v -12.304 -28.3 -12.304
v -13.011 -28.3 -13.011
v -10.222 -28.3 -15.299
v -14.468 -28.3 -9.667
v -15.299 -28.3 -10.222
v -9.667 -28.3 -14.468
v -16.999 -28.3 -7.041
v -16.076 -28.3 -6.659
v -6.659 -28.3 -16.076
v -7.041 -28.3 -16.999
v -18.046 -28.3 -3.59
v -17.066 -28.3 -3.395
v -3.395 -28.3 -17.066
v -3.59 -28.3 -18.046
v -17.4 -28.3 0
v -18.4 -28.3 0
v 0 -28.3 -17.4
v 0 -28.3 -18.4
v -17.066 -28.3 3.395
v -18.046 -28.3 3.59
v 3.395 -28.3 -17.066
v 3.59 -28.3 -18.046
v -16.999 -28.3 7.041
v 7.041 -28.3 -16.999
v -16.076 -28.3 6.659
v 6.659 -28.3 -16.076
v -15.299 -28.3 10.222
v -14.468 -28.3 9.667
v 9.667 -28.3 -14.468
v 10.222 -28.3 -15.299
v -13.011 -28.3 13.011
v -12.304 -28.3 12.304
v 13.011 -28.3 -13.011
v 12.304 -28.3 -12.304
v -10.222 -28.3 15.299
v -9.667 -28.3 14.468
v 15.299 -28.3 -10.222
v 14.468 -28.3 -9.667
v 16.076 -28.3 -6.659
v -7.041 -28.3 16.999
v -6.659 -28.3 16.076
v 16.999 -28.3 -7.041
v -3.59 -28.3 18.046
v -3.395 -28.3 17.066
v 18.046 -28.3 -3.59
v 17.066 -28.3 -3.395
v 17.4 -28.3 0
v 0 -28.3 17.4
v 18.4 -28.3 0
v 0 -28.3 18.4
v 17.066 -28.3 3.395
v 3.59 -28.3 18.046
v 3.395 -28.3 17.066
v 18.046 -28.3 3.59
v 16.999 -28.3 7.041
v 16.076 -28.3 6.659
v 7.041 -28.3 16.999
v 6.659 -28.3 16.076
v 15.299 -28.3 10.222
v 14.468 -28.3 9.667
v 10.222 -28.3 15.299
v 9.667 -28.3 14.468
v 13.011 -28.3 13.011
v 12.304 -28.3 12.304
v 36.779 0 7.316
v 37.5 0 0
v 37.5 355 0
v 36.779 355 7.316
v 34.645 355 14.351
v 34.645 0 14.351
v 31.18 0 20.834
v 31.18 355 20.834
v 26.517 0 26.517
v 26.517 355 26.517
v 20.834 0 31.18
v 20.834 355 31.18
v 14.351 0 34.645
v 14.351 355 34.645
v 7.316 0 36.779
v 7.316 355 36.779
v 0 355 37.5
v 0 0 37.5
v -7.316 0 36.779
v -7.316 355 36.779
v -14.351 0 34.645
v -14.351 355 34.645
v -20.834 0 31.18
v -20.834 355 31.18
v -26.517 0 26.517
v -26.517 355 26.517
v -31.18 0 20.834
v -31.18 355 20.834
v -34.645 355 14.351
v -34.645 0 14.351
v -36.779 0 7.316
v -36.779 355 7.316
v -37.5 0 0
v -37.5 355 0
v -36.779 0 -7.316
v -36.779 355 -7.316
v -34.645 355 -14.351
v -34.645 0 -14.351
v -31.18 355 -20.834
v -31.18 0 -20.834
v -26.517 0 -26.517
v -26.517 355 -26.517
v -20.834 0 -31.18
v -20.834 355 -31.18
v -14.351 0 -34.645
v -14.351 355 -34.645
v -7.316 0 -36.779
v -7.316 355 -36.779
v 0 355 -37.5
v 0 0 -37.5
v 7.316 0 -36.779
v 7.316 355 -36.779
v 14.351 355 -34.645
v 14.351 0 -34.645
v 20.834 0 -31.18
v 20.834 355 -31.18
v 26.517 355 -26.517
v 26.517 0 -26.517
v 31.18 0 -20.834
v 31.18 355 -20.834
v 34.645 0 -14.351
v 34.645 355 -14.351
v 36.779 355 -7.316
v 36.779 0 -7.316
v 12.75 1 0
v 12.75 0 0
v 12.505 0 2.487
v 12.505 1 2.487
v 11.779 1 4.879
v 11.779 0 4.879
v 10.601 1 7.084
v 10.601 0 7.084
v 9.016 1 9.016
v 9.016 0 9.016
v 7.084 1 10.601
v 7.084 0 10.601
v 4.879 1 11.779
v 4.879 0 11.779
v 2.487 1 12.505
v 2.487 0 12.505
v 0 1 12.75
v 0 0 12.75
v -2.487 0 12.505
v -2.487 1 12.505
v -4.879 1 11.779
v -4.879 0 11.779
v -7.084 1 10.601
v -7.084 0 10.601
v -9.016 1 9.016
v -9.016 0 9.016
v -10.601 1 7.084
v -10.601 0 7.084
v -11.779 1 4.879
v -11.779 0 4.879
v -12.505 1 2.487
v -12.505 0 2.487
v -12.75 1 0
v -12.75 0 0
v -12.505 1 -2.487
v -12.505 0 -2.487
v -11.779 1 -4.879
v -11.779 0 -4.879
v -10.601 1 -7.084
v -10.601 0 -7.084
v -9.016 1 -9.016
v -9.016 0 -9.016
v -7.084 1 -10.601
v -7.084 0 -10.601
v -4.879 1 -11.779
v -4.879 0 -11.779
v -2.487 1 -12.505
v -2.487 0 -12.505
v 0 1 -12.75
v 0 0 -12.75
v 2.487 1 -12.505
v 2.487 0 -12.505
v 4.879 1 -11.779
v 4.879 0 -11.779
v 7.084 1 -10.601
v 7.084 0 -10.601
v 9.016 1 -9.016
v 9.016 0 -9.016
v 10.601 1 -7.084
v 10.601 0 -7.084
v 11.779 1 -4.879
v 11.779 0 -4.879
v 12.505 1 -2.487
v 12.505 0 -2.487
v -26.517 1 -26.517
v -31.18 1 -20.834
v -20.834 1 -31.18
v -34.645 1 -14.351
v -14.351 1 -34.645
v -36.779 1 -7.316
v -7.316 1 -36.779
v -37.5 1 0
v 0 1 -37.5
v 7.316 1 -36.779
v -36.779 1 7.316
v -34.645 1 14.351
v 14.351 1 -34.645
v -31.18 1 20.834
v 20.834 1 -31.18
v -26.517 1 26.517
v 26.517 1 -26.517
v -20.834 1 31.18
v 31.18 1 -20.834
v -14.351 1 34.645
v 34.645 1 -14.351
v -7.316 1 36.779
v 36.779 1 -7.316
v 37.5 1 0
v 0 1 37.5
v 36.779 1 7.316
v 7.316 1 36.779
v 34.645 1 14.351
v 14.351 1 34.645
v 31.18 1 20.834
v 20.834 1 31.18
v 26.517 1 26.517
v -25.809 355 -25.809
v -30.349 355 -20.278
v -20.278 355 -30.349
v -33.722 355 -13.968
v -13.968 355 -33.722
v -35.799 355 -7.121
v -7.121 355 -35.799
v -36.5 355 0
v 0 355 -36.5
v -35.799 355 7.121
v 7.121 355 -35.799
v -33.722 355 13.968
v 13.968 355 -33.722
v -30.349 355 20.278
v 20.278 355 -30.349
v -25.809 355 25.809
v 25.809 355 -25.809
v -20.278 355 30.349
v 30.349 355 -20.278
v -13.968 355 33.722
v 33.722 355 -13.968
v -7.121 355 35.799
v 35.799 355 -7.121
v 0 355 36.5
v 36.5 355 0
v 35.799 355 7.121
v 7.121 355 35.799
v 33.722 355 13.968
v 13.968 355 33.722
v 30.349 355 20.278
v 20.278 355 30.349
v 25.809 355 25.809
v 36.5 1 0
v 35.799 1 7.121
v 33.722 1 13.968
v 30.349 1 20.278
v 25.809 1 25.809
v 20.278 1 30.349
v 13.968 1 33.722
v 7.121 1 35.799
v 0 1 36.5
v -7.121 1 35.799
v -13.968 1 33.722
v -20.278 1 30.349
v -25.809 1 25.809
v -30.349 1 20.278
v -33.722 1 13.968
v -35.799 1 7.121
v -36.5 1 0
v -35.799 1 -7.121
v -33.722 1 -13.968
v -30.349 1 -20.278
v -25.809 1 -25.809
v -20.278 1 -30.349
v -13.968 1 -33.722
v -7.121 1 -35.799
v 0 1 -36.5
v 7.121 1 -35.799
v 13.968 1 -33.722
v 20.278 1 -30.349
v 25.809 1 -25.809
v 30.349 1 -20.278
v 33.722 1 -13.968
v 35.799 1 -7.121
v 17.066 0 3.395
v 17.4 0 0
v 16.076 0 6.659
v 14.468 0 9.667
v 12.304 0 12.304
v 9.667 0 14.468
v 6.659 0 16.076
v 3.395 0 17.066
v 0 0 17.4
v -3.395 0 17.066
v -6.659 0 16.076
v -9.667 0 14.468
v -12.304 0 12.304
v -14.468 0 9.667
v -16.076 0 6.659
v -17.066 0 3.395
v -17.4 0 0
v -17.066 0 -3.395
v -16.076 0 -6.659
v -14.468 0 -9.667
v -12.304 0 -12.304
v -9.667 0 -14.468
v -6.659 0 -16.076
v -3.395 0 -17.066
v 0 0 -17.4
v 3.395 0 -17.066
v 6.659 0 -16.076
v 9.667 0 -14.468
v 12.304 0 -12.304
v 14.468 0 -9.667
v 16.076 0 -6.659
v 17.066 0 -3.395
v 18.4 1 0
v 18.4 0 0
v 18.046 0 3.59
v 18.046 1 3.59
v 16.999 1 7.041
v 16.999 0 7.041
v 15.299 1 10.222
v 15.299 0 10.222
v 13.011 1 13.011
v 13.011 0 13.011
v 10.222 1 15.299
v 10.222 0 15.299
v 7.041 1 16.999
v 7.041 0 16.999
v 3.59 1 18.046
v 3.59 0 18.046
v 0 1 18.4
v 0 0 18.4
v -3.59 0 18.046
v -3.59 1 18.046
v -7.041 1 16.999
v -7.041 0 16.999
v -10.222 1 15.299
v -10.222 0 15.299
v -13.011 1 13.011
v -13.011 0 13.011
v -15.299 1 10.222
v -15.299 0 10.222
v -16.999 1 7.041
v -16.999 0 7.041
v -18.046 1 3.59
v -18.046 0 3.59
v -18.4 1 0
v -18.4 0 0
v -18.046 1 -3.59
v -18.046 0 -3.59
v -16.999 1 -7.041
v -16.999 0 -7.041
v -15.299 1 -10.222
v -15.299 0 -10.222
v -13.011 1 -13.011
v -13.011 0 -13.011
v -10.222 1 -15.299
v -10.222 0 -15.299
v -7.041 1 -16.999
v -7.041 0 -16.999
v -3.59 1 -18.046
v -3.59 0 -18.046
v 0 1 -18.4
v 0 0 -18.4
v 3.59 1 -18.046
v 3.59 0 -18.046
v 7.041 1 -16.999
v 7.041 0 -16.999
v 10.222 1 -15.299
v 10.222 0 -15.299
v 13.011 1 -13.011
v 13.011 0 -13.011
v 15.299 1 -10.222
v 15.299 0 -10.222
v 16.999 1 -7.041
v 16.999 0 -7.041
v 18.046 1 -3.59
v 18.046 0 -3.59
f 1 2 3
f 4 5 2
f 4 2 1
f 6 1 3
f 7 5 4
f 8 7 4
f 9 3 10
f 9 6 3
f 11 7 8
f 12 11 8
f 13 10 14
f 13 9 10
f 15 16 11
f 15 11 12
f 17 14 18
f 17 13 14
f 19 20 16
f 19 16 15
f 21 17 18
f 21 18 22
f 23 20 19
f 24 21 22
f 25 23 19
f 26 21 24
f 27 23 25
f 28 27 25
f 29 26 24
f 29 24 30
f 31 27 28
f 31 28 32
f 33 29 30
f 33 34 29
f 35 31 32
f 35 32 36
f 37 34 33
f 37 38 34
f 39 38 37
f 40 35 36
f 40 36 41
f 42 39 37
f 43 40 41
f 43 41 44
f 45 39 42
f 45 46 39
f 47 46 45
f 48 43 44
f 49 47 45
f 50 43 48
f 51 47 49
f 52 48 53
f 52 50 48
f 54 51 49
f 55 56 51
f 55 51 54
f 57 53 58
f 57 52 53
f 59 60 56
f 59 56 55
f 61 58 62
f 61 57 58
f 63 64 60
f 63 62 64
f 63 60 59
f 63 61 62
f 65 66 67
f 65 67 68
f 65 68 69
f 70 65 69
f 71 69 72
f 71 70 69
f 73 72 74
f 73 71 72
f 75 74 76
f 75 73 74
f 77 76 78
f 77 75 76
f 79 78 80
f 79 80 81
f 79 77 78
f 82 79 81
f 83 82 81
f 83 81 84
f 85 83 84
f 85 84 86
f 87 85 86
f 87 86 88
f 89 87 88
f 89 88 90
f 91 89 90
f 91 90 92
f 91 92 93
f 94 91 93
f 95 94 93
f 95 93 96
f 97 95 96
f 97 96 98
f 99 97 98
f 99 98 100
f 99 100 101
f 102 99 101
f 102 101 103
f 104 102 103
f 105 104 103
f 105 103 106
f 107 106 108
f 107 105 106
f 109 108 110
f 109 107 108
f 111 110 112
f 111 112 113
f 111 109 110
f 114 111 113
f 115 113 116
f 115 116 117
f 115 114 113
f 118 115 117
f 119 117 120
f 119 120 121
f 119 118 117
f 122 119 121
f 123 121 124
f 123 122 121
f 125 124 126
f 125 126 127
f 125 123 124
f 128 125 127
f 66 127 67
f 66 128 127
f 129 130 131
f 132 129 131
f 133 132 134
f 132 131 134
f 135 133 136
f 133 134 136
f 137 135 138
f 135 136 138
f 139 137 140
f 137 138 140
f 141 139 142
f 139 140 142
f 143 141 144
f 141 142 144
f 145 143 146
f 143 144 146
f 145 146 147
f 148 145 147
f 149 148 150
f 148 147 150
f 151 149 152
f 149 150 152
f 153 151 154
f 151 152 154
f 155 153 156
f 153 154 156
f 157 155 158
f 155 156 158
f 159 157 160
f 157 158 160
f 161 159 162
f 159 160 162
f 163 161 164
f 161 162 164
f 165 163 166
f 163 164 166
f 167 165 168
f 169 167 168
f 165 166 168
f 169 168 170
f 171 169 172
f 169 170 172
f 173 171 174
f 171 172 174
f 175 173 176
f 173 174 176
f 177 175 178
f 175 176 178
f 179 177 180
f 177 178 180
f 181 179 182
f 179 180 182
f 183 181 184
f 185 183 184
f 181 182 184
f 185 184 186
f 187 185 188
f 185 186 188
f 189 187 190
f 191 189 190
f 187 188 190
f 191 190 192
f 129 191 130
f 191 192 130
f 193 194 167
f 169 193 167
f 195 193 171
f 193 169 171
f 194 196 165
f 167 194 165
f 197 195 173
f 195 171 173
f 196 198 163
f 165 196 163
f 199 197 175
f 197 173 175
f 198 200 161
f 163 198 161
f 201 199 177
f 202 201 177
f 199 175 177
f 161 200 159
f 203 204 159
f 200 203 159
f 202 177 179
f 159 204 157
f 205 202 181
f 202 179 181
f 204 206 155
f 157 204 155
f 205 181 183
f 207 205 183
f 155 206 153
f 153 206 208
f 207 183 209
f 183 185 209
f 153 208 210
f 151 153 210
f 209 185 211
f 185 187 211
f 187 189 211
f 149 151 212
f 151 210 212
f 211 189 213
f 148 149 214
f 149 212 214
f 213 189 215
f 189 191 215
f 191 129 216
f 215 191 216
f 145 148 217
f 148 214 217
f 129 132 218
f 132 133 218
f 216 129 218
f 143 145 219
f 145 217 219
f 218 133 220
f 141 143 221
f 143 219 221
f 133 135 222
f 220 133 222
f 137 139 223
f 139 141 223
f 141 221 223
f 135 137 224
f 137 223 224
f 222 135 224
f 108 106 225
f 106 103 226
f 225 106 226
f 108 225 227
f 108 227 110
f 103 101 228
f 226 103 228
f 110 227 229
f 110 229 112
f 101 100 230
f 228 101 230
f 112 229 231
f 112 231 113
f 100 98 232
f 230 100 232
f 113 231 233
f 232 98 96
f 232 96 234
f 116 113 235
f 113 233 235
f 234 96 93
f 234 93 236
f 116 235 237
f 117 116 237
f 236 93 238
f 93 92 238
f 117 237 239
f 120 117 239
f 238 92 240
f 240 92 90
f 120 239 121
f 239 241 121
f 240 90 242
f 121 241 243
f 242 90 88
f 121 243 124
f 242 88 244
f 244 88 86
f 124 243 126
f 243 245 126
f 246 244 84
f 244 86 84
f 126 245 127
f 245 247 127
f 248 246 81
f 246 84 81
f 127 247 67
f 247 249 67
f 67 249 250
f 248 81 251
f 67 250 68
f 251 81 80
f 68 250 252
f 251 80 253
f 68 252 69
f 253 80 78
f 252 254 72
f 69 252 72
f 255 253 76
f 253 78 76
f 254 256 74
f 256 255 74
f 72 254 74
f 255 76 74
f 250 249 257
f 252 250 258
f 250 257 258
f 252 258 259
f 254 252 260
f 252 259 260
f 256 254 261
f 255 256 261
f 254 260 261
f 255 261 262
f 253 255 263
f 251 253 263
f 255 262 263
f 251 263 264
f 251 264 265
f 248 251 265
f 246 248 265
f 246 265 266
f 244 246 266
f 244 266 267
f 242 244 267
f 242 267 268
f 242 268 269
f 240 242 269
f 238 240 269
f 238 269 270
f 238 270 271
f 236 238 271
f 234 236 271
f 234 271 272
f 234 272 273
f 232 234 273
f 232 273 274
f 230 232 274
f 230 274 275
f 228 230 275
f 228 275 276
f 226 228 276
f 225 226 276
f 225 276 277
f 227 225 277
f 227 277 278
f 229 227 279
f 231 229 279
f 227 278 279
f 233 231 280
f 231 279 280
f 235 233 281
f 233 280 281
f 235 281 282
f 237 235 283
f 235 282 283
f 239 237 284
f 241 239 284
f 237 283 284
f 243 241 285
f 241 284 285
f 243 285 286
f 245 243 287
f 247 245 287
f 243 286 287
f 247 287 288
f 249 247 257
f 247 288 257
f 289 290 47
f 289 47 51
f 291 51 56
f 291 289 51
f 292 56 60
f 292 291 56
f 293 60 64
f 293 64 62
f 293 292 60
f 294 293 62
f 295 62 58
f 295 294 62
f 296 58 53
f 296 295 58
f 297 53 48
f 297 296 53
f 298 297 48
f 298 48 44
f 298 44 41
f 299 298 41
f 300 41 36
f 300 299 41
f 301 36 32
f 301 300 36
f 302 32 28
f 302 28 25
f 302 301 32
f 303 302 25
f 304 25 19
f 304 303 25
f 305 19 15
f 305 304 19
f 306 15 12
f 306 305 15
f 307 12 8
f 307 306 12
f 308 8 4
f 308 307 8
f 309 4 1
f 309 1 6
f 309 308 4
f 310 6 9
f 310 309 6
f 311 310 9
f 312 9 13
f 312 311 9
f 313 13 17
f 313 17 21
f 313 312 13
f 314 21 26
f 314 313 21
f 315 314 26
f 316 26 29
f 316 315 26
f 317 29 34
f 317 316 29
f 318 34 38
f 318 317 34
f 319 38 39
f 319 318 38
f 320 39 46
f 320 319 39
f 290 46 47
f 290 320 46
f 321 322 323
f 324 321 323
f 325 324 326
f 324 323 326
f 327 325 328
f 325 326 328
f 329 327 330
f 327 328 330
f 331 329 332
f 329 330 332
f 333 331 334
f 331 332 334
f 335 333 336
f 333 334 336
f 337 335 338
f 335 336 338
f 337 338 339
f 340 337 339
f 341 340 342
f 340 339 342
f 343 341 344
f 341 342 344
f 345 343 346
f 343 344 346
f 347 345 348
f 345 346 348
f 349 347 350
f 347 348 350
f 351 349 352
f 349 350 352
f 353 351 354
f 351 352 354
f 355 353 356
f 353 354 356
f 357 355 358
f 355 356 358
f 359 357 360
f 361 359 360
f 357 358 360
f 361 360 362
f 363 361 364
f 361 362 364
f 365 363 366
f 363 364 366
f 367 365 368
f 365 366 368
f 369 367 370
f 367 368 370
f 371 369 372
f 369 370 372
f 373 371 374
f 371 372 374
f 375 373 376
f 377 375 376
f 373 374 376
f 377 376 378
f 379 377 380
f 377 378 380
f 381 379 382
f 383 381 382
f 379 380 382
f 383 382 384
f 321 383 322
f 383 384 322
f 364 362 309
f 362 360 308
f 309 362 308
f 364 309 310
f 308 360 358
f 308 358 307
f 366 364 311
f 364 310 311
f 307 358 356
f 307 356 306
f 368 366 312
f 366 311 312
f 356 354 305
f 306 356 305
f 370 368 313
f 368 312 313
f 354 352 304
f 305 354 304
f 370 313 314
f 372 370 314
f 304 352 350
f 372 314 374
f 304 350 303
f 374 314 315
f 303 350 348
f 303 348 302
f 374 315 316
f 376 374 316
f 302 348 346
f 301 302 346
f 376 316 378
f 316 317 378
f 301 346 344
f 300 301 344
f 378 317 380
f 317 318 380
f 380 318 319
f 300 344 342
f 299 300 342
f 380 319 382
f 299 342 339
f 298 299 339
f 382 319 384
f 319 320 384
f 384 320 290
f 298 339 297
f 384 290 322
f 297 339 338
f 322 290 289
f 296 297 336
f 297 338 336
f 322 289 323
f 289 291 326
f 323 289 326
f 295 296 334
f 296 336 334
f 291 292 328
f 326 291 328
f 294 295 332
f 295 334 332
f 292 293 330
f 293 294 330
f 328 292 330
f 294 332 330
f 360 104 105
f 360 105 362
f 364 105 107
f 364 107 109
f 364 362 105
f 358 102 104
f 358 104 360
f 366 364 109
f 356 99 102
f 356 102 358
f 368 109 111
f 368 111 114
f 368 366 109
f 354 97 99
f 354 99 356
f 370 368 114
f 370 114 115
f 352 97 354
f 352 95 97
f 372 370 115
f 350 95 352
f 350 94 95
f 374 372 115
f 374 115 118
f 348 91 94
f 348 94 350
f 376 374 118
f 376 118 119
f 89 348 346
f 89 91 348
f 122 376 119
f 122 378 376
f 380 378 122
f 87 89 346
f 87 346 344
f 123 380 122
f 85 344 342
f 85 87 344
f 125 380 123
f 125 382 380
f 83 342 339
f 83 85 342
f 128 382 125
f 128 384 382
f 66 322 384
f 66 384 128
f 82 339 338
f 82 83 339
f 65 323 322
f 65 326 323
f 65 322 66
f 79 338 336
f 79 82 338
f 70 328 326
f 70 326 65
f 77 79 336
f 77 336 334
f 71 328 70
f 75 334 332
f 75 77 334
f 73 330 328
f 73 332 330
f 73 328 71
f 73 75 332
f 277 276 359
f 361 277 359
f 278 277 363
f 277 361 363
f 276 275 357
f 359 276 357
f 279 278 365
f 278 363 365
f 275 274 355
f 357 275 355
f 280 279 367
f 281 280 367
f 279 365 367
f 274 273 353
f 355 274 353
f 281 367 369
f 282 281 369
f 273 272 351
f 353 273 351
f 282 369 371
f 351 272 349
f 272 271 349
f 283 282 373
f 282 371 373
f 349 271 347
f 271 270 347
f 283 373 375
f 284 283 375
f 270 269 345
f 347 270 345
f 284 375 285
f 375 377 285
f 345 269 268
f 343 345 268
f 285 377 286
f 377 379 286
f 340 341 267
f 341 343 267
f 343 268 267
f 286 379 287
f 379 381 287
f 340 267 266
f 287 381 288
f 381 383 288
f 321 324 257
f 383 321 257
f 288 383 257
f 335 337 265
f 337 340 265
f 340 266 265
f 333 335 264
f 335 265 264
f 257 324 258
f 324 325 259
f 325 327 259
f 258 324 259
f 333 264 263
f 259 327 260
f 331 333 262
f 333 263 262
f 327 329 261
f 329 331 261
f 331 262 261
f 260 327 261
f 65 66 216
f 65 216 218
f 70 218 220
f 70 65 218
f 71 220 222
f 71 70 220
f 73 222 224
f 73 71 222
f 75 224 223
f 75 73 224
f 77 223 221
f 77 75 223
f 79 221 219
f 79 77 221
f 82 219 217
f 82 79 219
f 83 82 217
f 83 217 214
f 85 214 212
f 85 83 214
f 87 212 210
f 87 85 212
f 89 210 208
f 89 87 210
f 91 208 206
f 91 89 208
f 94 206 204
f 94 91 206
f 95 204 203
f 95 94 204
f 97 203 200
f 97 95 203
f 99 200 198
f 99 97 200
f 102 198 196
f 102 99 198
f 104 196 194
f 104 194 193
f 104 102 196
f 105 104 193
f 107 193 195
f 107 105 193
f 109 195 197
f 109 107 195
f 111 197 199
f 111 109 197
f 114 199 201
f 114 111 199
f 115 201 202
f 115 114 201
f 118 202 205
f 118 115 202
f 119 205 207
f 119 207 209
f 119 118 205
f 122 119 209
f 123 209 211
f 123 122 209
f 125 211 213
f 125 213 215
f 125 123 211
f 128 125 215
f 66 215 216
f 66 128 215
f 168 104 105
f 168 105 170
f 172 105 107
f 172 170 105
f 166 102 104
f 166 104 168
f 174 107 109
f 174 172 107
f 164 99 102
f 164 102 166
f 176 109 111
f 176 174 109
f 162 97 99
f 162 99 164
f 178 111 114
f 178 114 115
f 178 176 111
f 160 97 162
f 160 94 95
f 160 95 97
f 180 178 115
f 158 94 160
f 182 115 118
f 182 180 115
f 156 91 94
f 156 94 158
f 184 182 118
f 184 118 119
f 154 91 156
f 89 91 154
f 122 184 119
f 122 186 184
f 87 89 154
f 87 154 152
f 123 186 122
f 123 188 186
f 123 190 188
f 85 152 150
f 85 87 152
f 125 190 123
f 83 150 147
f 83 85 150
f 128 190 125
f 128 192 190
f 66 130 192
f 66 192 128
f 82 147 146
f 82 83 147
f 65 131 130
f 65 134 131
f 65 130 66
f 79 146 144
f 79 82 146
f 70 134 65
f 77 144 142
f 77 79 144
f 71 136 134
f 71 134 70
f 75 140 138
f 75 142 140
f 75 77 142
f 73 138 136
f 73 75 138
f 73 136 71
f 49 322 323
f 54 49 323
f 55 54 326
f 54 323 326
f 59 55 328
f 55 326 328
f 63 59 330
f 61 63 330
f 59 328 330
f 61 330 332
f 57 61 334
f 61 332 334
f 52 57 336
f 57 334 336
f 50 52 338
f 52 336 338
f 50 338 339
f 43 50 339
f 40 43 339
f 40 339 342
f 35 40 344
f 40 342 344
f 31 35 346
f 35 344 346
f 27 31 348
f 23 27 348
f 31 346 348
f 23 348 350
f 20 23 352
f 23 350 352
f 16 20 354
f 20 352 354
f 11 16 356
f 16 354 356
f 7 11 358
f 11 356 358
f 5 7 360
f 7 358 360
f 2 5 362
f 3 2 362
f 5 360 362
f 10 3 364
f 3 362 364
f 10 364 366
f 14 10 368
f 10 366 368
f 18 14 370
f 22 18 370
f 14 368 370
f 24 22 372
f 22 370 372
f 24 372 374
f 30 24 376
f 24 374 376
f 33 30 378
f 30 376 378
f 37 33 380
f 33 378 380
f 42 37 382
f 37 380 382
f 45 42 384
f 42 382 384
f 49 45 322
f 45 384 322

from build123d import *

# Parameters (mm, degrees)
F0_R     = 18.4
F0_R_2   = 17.4
F1_DEPTH = 28.3
F2_R     = 37.5
F2_R_2   = 18.4
F3_DEPTH = 1
F4_R     = 37.5
F4_R_2   = 36.5
F5_DEPTH = 355
F6_R     = 37.5
F6_R_2   = 12.75
F7_DEPTH = 1


with BuildPart() as f1:
    # F0 (on Front) → F1 (new body)
    with BuildSketch(Plane.XZ):
        Circle(F0_R)
        Circle(F0_R_2, mode=Mode.SUBTRACT)
    extrude(amount=F1_DEPTH)


with BuildPart() as f3:
    # F2 (on Front) → F3 (new body)
    with BuildSketch(Plane.XZ):
        Circle(F2_R)
        Circle(F2_R_2, mode=Mode.SUBTRACT)
    extrude(amount=-F3_DEPTH)

    # F4 (on Front) → F5 (join)
    with BuildSketch(Plane.XZ):
        Circle(F4_R)
        Circle(F4_R_2, mode=Mode.SUBTRACT)
    extrude(amount=-F5_DEPTH)


with BuildPart() as f7:
    # F6 (on Front) → F7 (new body)
    with BuildSketch(Plane.XZ):
        Circle(F6_R)
        Circle(F6_R_2, mode=Mode.SUBTRACT)
    extrude(amount=-F7_DEPTH)


solid = Compound([f1.part, f3.part, f7.part])
